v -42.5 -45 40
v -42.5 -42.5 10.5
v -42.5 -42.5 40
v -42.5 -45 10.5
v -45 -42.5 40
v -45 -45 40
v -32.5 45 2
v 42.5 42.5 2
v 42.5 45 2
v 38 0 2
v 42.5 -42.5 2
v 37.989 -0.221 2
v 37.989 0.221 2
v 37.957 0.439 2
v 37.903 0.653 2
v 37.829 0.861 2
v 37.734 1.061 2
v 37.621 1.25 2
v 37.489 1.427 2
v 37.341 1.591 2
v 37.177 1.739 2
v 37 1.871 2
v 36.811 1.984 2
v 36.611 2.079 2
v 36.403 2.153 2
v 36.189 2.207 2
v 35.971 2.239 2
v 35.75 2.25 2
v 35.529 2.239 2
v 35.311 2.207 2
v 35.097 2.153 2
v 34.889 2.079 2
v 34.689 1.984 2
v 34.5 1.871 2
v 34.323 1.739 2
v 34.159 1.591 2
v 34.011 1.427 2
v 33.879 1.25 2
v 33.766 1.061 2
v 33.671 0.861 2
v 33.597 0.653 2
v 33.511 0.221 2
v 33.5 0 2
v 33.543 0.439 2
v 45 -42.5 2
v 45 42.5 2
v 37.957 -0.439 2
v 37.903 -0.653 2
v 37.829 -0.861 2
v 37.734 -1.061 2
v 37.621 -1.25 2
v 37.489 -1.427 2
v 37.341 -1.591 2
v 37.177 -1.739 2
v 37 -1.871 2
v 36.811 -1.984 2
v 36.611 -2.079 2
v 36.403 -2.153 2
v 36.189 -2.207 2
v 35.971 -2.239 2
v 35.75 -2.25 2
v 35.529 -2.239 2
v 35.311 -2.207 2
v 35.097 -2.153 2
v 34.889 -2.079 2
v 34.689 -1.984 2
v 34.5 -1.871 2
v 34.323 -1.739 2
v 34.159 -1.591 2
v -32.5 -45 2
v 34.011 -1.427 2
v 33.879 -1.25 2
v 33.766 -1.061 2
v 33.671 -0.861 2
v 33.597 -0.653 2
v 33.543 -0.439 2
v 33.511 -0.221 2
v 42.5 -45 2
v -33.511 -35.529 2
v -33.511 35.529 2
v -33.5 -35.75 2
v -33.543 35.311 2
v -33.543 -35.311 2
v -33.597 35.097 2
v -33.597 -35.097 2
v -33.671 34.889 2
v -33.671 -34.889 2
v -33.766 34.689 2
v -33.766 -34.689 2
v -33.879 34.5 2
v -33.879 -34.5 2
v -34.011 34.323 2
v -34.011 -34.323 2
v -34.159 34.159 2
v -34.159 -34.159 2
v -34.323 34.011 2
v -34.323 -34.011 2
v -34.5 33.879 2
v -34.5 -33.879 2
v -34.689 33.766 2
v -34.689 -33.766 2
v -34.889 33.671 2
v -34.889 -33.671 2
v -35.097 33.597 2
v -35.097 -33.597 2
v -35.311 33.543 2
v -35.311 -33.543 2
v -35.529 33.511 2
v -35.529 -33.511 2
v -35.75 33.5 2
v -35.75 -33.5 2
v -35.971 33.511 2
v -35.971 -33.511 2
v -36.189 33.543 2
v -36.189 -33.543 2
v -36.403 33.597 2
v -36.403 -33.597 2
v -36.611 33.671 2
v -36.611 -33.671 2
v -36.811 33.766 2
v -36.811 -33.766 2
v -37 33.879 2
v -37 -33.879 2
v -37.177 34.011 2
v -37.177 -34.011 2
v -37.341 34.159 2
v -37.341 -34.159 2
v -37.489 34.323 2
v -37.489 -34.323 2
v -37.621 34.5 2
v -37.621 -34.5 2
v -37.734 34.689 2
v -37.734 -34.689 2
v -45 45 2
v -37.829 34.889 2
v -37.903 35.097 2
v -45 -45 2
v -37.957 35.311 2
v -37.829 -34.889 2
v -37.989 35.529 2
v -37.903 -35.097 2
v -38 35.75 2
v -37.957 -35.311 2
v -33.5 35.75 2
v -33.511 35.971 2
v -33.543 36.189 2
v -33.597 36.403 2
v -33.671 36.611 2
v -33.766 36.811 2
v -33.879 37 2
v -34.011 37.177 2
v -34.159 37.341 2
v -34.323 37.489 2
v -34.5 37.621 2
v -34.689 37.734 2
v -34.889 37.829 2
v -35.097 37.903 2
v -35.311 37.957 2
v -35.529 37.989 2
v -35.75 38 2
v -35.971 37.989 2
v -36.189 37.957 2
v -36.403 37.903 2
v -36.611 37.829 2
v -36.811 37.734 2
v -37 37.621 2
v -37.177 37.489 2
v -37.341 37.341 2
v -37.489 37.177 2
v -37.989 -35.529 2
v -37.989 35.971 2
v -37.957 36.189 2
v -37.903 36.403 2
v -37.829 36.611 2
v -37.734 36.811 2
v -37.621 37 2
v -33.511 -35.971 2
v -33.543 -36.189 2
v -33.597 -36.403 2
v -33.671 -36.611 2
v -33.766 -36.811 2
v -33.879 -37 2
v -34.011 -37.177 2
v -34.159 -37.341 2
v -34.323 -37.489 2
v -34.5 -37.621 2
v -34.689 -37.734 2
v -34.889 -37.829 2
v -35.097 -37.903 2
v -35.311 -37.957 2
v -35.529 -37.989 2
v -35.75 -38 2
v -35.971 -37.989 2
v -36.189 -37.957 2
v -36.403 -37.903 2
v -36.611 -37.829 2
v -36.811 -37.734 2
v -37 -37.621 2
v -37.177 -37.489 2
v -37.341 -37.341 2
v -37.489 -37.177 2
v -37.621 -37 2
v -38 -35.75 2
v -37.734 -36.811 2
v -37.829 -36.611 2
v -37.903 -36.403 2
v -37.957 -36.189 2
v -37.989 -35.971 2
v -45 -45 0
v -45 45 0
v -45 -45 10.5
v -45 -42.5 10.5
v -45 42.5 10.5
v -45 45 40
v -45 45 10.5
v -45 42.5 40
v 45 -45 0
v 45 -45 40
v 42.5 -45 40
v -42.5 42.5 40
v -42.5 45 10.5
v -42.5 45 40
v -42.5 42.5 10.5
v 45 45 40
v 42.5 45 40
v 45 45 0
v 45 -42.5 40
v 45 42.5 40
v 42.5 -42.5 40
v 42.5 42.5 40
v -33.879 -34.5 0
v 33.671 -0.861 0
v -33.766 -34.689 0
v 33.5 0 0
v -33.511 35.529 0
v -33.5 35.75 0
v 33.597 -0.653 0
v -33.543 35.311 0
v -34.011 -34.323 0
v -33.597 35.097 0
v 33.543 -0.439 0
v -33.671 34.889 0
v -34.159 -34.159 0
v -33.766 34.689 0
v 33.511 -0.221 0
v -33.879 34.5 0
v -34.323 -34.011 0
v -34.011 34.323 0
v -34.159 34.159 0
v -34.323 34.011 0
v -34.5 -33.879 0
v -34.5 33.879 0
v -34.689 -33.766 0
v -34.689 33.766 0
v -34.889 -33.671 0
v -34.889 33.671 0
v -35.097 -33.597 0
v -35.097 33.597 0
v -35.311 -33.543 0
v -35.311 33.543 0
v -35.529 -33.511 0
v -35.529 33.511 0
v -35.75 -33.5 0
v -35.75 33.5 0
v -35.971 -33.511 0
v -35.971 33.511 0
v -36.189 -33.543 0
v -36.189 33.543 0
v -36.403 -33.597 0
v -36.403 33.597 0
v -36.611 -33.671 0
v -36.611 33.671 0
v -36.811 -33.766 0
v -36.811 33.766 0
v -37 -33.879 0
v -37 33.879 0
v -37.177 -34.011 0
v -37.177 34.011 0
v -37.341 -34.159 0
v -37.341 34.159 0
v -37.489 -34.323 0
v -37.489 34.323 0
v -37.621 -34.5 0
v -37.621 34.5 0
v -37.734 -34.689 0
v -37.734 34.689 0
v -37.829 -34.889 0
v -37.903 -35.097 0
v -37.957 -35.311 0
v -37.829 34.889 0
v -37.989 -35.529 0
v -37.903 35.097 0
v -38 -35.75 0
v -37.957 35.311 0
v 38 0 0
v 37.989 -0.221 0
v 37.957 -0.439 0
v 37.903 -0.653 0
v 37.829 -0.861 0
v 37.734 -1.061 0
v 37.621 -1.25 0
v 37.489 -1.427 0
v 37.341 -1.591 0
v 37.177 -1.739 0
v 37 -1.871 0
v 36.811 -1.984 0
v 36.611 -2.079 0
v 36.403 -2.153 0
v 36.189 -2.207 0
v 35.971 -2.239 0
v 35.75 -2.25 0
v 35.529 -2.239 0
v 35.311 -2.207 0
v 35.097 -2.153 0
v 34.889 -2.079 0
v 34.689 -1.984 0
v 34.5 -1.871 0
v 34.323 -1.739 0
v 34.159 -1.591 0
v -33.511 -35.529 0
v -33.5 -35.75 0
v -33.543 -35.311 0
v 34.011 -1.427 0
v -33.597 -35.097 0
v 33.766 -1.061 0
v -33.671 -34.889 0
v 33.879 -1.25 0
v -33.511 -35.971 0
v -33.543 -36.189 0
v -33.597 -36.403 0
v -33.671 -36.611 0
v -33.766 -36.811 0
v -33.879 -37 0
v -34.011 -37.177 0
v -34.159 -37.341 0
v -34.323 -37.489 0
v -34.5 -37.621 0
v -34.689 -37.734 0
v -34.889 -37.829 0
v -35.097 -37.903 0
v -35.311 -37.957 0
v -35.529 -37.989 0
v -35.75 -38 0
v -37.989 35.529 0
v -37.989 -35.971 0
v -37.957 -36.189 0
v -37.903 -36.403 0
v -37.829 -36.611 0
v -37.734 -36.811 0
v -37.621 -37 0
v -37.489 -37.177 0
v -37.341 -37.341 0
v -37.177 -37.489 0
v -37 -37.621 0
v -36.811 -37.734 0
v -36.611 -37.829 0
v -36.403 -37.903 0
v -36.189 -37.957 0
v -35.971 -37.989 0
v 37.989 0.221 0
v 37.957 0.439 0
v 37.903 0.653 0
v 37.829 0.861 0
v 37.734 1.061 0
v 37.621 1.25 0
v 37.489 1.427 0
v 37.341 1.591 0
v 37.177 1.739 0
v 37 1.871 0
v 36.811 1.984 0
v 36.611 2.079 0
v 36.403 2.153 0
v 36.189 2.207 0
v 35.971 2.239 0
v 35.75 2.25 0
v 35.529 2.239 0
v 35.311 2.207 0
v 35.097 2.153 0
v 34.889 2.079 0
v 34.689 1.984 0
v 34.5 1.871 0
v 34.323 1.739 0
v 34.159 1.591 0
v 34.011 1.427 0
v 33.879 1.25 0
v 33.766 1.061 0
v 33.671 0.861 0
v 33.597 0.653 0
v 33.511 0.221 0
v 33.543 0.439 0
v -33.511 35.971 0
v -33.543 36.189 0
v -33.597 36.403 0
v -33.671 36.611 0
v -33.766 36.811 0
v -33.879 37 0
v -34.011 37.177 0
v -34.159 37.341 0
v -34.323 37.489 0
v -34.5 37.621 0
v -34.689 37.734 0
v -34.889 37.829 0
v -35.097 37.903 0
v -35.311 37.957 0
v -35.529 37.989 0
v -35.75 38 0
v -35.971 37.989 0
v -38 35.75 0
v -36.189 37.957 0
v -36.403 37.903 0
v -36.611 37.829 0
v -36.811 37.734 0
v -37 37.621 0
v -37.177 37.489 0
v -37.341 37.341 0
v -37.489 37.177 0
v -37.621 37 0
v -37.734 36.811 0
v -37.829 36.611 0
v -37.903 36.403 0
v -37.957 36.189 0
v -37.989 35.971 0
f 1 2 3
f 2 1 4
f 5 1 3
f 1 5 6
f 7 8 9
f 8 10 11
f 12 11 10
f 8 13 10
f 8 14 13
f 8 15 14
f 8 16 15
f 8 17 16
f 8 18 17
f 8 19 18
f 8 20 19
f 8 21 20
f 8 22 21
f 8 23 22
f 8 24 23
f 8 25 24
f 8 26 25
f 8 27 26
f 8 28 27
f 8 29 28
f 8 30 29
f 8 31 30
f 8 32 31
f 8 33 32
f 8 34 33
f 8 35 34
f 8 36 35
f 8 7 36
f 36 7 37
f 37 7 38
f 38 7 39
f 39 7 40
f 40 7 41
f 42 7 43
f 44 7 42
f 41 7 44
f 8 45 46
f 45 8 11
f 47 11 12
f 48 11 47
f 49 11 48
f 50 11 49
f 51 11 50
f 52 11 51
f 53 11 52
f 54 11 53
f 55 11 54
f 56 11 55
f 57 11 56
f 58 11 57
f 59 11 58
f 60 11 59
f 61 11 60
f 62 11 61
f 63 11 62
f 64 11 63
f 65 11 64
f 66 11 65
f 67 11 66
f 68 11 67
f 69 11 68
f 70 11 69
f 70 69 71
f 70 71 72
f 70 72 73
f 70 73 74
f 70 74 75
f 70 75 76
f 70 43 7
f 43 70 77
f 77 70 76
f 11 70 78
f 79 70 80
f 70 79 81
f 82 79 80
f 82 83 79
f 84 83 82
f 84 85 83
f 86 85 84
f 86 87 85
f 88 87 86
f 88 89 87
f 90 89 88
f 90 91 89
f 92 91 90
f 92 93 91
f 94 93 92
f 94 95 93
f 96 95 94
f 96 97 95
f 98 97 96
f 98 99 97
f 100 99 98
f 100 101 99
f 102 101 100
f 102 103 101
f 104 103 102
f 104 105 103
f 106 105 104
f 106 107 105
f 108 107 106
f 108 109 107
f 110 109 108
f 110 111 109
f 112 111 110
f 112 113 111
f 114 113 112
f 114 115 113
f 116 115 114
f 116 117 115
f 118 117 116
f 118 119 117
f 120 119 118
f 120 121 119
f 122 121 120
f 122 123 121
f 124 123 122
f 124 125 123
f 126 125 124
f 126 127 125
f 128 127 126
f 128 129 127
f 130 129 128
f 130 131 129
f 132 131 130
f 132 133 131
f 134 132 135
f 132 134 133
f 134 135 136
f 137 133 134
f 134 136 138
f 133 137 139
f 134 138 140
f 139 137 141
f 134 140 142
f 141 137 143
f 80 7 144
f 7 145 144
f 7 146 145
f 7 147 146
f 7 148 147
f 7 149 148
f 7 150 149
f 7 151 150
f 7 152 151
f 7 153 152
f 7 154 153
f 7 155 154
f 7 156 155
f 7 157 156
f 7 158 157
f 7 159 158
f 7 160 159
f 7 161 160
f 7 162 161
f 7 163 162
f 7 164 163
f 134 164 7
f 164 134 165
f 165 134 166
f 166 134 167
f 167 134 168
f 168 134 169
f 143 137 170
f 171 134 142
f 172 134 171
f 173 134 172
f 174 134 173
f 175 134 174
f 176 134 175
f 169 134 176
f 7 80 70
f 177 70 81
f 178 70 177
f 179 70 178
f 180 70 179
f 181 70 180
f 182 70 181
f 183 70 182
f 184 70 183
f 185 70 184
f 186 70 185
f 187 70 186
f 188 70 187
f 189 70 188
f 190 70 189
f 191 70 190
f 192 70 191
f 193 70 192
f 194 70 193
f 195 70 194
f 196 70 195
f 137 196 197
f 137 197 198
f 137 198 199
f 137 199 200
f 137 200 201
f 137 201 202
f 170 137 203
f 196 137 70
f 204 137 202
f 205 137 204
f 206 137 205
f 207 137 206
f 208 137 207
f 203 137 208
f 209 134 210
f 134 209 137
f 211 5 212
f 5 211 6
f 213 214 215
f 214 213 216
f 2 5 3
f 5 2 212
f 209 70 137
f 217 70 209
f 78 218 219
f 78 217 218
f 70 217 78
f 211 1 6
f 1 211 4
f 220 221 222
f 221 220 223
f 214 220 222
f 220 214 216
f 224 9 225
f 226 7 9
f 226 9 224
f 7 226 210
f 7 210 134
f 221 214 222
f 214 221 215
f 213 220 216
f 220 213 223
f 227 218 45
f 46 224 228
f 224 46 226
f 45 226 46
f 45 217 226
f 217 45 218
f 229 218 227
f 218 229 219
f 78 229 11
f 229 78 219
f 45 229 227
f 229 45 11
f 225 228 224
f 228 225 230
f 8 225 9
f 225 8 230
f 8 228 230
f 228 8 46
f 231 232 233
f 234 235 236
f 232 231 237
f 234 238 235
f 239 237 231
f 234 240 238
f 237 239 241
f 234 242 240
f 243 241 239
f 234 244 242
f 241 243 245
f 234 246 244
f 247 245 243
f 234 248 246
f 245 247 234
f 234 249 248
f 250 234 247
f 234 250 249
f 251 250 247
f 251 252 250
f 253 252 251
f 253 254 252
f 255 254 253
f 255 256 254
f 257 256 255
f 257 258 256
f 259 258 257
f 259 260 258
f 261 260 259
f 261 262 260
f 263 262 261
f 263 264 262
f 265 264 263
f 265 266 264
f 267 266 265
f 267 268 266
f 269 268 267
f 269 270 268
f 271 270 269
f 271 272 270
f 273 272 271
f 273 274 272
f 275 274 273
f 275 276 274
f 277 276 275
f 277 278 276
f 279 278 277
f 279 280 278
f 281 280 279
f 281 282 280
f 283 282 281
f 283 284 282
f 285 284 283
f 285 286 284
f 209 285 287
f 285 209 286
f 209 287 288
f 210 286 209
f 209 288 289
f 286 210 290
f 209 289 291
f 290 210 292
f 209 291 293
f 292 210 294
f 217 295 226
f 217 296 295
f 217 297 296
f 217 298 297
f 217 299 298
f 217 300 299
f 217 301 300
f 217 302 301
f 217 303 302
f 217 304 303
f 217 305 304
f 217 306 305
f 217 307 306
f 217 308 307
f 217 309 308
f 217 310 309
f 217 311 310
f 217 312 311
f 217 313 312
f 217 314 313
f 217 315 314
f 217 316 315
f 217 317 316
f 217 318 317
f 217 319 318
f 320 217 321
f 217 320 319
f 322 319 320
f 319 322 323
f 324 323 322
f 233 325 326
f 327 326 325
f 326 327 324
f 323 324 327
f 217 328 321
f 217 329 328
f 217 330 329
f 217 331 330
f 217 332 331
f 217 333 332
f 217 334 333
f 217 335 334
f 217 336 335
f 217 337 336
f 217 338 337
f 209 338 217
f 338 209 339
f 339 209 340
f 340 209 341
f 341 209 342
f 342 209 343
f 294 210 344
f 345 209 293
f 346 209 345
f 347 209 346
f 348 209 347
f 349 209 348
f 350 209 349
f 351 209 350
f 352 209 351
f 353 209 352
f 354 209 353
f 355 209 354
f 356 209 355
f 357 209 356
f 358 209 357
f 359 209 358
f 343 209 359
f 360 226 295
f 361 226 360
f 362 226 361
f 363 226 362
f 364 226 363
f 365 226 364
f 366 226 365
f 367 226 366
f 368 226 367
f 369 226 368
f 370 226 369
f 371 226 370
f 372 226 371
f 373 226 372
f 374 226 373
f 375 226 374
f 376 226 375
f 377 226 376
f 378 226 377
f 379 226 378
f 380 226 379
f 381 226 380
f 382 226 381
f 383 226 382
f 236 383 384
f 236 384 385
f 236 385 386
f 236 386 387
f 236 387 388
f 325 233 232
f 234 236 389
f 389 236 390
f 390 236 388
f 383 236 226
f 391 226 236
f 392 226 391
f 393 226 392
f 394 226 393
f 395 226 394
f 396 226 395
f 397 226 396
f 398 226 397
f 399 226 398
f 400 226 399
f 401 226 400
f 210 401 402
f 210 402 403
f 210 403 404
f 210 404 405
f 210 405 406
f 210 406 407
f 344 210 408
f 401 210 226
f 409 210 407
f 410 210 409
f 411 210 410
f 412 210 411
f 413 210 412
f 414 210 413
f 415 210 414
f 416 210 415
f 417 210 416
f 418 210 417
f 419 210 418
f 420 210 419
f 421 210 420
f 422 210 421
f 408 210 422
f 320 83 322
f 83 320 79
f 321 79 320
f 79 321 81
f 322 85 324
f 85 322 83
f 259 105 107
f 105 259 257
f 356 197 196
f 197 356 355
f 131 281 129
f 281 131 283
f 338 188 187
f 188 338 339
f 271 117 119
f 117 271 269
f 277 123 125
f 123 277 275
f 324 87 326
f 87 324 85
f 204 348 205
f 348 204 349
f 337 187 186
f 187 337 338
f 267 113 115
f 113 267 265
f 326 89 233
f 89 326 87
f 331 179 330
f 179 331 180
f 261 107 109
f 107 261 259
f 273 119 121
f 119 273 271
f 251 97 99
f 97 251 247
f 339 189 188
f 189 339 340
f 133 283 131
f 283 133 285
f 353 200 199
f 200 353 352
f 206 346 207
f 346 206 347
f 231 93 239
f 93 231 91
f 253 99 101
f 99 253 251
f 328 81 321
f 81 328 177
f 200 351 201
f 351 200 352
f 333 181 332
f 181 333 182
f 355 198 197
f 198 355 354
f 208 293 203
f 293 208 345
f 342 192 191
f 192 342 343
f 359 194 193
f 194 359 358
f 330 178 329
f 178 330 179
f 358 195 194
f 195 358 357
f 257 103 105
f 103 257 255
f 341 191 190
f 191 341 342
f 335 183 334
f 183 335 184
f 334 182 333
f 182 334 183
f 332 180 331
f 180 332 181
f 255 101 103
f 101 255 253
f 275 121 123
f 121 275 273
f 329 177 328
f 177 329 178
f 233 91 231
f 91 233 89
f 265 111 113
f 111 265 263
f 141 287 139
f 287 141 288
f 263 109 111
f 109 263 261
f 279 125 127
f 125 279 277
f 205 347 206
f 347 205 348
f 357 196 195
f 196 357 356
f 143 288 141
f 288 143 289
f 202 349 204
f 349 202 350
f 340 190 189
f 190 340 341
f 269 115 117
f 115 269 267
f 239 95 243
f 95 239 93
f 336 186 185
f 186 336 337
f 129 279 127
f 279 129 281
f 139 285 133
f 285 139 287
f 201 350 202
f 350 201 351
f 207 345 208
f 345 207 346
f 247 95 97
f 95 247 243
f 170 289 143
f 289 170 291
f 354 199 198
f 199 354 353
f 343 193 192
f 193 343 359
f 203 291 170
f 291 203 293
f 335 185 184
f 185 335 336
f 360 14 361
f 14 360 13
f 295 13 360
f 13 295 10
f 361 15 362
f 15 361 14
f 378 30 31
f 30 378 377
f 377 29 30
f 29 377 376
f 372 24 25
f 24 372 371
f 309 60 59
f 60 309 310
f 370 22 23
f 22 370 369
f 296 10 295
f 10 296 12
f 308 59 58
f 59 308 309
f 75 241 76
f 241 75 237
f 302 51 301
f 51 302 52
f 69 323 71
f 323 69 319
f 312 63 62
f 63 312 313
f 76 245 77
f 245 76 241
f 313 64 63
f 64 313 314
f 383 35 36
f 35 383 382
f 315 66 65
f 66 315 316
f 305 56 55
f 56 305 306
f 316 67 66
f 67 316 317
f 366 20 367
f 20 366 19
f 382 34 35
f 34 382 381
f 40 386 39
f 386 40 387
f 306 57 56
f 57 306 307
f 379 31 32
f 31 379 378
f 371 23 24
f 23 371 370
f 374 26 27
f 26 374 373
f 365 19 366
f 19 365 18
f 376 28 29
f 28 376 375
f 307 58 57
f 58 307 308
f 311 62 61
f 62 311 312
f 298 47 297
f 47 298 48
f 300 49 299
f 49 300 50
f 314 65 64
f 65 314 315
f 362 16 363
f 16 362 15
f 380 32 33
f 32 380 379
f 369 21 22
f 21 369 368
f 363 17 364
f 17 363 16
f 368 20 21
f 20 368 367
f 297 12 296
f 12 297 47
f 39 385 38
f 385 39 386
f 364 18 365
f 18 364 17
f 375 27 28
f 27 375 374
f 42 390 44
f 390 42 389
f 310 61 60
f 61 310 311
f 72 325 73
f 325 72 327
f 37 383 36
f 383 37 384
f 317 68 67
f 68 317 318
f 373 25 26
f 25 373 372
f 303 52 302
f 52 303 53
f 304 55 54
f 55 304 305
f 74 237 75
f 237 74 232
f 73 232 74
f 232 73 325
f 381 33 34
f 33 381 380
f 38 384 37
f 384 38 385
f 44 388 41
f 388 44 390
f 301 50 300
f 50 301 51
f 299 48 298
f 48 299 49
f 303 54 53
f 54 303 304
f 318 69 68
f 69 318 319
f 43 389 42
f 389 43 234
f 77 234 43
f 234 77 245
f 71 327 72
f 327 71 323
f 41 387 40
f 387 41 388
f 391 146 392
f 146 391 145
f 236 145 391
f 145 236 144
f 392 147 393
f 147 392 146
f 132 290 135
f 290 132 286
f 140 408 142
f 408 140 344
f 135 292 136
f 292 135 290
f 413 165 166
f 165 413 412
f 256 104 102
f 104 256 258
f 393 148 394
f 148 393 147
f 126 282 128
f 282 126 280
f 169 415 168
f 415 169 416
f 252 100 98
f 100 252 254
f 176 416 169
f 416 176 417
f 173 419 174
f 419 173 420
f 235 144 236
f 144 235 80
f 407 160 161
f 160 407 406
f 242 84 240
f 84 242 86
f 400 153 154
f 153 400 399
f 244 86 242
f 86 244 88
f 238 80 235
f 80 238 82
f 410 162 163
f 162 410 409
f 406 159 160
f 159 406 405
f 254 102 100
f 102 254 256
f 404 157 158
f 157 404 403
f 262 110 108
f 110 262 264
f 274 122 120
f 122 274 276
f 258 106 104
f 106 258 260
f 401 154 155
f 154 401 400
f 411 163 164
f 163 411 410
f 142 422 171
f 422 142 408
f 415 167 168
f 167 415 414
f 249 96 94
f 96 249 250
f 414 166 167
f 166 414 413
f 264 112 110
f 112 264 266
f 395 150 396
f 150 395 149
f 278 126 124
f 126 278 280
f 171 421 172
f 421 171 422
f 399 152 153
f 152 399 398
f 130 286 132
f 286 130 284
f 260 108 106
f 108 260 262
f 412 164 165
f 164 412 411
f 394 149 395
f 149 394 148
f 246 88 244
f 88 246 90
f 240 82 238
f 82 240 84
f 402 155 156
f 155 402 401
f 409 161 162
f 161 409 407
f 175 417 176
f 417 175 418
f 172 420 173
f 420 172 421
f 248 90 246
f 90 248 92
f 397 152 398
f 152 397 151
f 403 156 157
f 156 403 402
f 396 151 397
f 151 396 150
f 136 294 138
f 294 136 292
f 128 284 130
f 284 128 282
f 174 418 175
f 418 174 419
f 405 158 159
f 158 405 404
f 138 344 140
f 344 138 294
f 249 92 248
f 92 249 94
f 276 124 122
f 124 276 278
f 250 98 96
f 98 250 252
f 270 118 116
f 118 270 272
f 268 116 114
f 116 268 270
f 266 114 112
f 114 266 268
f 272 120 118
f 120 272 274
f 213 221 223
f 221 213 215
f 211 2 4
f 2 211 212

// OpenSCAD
// DIY magnetic stirrer housing for 80 mm PC case fan
// Print orientation: top plate on bed (z = 0), walls build upward (+Z)
// Note: this is the upside-down open box used in practice

// ---------- Parameters ----------
outer_size   = 90;    // outer size of top plate and box (X x Y)
plate_t      = 2;     // top plate thickness (z = 0 to 2)
wall_t       = 2.5;   // wall thickness (z = 2 to 40)
box_h        = 40;    // total height of box from bed (top edge at z = 40)
hole_d       = 4.5;   // screw hole diameter (M4)
hole_pitch   = 71.5;  // square pattern pitch for screw holes
hole_count   = 4;     // number of screw holes
notch_w      = 12;    // power cable notch width
notch_depth  = 8;     // notch depth from open edge (z = 32 to 40)
eps          = 0.5;   // cutter overshoot past faces

$fn = 64;

// ---------- Model ----------
difference() {
    union() {
        // Top plate (lies on bed)
        translate([-outer_size/2, -outer_size/2, 0])
            cube([outer_size, outer_size, plate_t]);

        // Four walls rising from plate to open top (z = 40)
        for (sx = [-1, 1], sy = [-1, 1]) {
            translate([sx > 0 ? outer_size/2 - wall_t : -outer_size/2,
                       sy > 0 ? outer_size/2 - wall_t : -outer_size/2,
                       plate_t])
                cube([wall_t, wall_t, box_h - plate_t]);
        }
    }

    // Screw holes through top plate on square pattern
    for (i = [0 : hole_count - 1]) {
        x = (i % 2 - 0.5) * hole_pitch;
        y = (i / 2 - 0.5) * hole_pitch;
        translate([x, y, -eps])
            cylinder(d = hole_d, h = plate_t + 2*eps);
    }

    // Power cable notch in one wall (z = 32 to 40, open edge at z = 40)
    translate([-outer_size/2 - eps, -outer_size/2 - eps, plate_t])
        cube([notch_w + 2*eps, outer_size + 2*eps, notch_depth + eps]);
}
